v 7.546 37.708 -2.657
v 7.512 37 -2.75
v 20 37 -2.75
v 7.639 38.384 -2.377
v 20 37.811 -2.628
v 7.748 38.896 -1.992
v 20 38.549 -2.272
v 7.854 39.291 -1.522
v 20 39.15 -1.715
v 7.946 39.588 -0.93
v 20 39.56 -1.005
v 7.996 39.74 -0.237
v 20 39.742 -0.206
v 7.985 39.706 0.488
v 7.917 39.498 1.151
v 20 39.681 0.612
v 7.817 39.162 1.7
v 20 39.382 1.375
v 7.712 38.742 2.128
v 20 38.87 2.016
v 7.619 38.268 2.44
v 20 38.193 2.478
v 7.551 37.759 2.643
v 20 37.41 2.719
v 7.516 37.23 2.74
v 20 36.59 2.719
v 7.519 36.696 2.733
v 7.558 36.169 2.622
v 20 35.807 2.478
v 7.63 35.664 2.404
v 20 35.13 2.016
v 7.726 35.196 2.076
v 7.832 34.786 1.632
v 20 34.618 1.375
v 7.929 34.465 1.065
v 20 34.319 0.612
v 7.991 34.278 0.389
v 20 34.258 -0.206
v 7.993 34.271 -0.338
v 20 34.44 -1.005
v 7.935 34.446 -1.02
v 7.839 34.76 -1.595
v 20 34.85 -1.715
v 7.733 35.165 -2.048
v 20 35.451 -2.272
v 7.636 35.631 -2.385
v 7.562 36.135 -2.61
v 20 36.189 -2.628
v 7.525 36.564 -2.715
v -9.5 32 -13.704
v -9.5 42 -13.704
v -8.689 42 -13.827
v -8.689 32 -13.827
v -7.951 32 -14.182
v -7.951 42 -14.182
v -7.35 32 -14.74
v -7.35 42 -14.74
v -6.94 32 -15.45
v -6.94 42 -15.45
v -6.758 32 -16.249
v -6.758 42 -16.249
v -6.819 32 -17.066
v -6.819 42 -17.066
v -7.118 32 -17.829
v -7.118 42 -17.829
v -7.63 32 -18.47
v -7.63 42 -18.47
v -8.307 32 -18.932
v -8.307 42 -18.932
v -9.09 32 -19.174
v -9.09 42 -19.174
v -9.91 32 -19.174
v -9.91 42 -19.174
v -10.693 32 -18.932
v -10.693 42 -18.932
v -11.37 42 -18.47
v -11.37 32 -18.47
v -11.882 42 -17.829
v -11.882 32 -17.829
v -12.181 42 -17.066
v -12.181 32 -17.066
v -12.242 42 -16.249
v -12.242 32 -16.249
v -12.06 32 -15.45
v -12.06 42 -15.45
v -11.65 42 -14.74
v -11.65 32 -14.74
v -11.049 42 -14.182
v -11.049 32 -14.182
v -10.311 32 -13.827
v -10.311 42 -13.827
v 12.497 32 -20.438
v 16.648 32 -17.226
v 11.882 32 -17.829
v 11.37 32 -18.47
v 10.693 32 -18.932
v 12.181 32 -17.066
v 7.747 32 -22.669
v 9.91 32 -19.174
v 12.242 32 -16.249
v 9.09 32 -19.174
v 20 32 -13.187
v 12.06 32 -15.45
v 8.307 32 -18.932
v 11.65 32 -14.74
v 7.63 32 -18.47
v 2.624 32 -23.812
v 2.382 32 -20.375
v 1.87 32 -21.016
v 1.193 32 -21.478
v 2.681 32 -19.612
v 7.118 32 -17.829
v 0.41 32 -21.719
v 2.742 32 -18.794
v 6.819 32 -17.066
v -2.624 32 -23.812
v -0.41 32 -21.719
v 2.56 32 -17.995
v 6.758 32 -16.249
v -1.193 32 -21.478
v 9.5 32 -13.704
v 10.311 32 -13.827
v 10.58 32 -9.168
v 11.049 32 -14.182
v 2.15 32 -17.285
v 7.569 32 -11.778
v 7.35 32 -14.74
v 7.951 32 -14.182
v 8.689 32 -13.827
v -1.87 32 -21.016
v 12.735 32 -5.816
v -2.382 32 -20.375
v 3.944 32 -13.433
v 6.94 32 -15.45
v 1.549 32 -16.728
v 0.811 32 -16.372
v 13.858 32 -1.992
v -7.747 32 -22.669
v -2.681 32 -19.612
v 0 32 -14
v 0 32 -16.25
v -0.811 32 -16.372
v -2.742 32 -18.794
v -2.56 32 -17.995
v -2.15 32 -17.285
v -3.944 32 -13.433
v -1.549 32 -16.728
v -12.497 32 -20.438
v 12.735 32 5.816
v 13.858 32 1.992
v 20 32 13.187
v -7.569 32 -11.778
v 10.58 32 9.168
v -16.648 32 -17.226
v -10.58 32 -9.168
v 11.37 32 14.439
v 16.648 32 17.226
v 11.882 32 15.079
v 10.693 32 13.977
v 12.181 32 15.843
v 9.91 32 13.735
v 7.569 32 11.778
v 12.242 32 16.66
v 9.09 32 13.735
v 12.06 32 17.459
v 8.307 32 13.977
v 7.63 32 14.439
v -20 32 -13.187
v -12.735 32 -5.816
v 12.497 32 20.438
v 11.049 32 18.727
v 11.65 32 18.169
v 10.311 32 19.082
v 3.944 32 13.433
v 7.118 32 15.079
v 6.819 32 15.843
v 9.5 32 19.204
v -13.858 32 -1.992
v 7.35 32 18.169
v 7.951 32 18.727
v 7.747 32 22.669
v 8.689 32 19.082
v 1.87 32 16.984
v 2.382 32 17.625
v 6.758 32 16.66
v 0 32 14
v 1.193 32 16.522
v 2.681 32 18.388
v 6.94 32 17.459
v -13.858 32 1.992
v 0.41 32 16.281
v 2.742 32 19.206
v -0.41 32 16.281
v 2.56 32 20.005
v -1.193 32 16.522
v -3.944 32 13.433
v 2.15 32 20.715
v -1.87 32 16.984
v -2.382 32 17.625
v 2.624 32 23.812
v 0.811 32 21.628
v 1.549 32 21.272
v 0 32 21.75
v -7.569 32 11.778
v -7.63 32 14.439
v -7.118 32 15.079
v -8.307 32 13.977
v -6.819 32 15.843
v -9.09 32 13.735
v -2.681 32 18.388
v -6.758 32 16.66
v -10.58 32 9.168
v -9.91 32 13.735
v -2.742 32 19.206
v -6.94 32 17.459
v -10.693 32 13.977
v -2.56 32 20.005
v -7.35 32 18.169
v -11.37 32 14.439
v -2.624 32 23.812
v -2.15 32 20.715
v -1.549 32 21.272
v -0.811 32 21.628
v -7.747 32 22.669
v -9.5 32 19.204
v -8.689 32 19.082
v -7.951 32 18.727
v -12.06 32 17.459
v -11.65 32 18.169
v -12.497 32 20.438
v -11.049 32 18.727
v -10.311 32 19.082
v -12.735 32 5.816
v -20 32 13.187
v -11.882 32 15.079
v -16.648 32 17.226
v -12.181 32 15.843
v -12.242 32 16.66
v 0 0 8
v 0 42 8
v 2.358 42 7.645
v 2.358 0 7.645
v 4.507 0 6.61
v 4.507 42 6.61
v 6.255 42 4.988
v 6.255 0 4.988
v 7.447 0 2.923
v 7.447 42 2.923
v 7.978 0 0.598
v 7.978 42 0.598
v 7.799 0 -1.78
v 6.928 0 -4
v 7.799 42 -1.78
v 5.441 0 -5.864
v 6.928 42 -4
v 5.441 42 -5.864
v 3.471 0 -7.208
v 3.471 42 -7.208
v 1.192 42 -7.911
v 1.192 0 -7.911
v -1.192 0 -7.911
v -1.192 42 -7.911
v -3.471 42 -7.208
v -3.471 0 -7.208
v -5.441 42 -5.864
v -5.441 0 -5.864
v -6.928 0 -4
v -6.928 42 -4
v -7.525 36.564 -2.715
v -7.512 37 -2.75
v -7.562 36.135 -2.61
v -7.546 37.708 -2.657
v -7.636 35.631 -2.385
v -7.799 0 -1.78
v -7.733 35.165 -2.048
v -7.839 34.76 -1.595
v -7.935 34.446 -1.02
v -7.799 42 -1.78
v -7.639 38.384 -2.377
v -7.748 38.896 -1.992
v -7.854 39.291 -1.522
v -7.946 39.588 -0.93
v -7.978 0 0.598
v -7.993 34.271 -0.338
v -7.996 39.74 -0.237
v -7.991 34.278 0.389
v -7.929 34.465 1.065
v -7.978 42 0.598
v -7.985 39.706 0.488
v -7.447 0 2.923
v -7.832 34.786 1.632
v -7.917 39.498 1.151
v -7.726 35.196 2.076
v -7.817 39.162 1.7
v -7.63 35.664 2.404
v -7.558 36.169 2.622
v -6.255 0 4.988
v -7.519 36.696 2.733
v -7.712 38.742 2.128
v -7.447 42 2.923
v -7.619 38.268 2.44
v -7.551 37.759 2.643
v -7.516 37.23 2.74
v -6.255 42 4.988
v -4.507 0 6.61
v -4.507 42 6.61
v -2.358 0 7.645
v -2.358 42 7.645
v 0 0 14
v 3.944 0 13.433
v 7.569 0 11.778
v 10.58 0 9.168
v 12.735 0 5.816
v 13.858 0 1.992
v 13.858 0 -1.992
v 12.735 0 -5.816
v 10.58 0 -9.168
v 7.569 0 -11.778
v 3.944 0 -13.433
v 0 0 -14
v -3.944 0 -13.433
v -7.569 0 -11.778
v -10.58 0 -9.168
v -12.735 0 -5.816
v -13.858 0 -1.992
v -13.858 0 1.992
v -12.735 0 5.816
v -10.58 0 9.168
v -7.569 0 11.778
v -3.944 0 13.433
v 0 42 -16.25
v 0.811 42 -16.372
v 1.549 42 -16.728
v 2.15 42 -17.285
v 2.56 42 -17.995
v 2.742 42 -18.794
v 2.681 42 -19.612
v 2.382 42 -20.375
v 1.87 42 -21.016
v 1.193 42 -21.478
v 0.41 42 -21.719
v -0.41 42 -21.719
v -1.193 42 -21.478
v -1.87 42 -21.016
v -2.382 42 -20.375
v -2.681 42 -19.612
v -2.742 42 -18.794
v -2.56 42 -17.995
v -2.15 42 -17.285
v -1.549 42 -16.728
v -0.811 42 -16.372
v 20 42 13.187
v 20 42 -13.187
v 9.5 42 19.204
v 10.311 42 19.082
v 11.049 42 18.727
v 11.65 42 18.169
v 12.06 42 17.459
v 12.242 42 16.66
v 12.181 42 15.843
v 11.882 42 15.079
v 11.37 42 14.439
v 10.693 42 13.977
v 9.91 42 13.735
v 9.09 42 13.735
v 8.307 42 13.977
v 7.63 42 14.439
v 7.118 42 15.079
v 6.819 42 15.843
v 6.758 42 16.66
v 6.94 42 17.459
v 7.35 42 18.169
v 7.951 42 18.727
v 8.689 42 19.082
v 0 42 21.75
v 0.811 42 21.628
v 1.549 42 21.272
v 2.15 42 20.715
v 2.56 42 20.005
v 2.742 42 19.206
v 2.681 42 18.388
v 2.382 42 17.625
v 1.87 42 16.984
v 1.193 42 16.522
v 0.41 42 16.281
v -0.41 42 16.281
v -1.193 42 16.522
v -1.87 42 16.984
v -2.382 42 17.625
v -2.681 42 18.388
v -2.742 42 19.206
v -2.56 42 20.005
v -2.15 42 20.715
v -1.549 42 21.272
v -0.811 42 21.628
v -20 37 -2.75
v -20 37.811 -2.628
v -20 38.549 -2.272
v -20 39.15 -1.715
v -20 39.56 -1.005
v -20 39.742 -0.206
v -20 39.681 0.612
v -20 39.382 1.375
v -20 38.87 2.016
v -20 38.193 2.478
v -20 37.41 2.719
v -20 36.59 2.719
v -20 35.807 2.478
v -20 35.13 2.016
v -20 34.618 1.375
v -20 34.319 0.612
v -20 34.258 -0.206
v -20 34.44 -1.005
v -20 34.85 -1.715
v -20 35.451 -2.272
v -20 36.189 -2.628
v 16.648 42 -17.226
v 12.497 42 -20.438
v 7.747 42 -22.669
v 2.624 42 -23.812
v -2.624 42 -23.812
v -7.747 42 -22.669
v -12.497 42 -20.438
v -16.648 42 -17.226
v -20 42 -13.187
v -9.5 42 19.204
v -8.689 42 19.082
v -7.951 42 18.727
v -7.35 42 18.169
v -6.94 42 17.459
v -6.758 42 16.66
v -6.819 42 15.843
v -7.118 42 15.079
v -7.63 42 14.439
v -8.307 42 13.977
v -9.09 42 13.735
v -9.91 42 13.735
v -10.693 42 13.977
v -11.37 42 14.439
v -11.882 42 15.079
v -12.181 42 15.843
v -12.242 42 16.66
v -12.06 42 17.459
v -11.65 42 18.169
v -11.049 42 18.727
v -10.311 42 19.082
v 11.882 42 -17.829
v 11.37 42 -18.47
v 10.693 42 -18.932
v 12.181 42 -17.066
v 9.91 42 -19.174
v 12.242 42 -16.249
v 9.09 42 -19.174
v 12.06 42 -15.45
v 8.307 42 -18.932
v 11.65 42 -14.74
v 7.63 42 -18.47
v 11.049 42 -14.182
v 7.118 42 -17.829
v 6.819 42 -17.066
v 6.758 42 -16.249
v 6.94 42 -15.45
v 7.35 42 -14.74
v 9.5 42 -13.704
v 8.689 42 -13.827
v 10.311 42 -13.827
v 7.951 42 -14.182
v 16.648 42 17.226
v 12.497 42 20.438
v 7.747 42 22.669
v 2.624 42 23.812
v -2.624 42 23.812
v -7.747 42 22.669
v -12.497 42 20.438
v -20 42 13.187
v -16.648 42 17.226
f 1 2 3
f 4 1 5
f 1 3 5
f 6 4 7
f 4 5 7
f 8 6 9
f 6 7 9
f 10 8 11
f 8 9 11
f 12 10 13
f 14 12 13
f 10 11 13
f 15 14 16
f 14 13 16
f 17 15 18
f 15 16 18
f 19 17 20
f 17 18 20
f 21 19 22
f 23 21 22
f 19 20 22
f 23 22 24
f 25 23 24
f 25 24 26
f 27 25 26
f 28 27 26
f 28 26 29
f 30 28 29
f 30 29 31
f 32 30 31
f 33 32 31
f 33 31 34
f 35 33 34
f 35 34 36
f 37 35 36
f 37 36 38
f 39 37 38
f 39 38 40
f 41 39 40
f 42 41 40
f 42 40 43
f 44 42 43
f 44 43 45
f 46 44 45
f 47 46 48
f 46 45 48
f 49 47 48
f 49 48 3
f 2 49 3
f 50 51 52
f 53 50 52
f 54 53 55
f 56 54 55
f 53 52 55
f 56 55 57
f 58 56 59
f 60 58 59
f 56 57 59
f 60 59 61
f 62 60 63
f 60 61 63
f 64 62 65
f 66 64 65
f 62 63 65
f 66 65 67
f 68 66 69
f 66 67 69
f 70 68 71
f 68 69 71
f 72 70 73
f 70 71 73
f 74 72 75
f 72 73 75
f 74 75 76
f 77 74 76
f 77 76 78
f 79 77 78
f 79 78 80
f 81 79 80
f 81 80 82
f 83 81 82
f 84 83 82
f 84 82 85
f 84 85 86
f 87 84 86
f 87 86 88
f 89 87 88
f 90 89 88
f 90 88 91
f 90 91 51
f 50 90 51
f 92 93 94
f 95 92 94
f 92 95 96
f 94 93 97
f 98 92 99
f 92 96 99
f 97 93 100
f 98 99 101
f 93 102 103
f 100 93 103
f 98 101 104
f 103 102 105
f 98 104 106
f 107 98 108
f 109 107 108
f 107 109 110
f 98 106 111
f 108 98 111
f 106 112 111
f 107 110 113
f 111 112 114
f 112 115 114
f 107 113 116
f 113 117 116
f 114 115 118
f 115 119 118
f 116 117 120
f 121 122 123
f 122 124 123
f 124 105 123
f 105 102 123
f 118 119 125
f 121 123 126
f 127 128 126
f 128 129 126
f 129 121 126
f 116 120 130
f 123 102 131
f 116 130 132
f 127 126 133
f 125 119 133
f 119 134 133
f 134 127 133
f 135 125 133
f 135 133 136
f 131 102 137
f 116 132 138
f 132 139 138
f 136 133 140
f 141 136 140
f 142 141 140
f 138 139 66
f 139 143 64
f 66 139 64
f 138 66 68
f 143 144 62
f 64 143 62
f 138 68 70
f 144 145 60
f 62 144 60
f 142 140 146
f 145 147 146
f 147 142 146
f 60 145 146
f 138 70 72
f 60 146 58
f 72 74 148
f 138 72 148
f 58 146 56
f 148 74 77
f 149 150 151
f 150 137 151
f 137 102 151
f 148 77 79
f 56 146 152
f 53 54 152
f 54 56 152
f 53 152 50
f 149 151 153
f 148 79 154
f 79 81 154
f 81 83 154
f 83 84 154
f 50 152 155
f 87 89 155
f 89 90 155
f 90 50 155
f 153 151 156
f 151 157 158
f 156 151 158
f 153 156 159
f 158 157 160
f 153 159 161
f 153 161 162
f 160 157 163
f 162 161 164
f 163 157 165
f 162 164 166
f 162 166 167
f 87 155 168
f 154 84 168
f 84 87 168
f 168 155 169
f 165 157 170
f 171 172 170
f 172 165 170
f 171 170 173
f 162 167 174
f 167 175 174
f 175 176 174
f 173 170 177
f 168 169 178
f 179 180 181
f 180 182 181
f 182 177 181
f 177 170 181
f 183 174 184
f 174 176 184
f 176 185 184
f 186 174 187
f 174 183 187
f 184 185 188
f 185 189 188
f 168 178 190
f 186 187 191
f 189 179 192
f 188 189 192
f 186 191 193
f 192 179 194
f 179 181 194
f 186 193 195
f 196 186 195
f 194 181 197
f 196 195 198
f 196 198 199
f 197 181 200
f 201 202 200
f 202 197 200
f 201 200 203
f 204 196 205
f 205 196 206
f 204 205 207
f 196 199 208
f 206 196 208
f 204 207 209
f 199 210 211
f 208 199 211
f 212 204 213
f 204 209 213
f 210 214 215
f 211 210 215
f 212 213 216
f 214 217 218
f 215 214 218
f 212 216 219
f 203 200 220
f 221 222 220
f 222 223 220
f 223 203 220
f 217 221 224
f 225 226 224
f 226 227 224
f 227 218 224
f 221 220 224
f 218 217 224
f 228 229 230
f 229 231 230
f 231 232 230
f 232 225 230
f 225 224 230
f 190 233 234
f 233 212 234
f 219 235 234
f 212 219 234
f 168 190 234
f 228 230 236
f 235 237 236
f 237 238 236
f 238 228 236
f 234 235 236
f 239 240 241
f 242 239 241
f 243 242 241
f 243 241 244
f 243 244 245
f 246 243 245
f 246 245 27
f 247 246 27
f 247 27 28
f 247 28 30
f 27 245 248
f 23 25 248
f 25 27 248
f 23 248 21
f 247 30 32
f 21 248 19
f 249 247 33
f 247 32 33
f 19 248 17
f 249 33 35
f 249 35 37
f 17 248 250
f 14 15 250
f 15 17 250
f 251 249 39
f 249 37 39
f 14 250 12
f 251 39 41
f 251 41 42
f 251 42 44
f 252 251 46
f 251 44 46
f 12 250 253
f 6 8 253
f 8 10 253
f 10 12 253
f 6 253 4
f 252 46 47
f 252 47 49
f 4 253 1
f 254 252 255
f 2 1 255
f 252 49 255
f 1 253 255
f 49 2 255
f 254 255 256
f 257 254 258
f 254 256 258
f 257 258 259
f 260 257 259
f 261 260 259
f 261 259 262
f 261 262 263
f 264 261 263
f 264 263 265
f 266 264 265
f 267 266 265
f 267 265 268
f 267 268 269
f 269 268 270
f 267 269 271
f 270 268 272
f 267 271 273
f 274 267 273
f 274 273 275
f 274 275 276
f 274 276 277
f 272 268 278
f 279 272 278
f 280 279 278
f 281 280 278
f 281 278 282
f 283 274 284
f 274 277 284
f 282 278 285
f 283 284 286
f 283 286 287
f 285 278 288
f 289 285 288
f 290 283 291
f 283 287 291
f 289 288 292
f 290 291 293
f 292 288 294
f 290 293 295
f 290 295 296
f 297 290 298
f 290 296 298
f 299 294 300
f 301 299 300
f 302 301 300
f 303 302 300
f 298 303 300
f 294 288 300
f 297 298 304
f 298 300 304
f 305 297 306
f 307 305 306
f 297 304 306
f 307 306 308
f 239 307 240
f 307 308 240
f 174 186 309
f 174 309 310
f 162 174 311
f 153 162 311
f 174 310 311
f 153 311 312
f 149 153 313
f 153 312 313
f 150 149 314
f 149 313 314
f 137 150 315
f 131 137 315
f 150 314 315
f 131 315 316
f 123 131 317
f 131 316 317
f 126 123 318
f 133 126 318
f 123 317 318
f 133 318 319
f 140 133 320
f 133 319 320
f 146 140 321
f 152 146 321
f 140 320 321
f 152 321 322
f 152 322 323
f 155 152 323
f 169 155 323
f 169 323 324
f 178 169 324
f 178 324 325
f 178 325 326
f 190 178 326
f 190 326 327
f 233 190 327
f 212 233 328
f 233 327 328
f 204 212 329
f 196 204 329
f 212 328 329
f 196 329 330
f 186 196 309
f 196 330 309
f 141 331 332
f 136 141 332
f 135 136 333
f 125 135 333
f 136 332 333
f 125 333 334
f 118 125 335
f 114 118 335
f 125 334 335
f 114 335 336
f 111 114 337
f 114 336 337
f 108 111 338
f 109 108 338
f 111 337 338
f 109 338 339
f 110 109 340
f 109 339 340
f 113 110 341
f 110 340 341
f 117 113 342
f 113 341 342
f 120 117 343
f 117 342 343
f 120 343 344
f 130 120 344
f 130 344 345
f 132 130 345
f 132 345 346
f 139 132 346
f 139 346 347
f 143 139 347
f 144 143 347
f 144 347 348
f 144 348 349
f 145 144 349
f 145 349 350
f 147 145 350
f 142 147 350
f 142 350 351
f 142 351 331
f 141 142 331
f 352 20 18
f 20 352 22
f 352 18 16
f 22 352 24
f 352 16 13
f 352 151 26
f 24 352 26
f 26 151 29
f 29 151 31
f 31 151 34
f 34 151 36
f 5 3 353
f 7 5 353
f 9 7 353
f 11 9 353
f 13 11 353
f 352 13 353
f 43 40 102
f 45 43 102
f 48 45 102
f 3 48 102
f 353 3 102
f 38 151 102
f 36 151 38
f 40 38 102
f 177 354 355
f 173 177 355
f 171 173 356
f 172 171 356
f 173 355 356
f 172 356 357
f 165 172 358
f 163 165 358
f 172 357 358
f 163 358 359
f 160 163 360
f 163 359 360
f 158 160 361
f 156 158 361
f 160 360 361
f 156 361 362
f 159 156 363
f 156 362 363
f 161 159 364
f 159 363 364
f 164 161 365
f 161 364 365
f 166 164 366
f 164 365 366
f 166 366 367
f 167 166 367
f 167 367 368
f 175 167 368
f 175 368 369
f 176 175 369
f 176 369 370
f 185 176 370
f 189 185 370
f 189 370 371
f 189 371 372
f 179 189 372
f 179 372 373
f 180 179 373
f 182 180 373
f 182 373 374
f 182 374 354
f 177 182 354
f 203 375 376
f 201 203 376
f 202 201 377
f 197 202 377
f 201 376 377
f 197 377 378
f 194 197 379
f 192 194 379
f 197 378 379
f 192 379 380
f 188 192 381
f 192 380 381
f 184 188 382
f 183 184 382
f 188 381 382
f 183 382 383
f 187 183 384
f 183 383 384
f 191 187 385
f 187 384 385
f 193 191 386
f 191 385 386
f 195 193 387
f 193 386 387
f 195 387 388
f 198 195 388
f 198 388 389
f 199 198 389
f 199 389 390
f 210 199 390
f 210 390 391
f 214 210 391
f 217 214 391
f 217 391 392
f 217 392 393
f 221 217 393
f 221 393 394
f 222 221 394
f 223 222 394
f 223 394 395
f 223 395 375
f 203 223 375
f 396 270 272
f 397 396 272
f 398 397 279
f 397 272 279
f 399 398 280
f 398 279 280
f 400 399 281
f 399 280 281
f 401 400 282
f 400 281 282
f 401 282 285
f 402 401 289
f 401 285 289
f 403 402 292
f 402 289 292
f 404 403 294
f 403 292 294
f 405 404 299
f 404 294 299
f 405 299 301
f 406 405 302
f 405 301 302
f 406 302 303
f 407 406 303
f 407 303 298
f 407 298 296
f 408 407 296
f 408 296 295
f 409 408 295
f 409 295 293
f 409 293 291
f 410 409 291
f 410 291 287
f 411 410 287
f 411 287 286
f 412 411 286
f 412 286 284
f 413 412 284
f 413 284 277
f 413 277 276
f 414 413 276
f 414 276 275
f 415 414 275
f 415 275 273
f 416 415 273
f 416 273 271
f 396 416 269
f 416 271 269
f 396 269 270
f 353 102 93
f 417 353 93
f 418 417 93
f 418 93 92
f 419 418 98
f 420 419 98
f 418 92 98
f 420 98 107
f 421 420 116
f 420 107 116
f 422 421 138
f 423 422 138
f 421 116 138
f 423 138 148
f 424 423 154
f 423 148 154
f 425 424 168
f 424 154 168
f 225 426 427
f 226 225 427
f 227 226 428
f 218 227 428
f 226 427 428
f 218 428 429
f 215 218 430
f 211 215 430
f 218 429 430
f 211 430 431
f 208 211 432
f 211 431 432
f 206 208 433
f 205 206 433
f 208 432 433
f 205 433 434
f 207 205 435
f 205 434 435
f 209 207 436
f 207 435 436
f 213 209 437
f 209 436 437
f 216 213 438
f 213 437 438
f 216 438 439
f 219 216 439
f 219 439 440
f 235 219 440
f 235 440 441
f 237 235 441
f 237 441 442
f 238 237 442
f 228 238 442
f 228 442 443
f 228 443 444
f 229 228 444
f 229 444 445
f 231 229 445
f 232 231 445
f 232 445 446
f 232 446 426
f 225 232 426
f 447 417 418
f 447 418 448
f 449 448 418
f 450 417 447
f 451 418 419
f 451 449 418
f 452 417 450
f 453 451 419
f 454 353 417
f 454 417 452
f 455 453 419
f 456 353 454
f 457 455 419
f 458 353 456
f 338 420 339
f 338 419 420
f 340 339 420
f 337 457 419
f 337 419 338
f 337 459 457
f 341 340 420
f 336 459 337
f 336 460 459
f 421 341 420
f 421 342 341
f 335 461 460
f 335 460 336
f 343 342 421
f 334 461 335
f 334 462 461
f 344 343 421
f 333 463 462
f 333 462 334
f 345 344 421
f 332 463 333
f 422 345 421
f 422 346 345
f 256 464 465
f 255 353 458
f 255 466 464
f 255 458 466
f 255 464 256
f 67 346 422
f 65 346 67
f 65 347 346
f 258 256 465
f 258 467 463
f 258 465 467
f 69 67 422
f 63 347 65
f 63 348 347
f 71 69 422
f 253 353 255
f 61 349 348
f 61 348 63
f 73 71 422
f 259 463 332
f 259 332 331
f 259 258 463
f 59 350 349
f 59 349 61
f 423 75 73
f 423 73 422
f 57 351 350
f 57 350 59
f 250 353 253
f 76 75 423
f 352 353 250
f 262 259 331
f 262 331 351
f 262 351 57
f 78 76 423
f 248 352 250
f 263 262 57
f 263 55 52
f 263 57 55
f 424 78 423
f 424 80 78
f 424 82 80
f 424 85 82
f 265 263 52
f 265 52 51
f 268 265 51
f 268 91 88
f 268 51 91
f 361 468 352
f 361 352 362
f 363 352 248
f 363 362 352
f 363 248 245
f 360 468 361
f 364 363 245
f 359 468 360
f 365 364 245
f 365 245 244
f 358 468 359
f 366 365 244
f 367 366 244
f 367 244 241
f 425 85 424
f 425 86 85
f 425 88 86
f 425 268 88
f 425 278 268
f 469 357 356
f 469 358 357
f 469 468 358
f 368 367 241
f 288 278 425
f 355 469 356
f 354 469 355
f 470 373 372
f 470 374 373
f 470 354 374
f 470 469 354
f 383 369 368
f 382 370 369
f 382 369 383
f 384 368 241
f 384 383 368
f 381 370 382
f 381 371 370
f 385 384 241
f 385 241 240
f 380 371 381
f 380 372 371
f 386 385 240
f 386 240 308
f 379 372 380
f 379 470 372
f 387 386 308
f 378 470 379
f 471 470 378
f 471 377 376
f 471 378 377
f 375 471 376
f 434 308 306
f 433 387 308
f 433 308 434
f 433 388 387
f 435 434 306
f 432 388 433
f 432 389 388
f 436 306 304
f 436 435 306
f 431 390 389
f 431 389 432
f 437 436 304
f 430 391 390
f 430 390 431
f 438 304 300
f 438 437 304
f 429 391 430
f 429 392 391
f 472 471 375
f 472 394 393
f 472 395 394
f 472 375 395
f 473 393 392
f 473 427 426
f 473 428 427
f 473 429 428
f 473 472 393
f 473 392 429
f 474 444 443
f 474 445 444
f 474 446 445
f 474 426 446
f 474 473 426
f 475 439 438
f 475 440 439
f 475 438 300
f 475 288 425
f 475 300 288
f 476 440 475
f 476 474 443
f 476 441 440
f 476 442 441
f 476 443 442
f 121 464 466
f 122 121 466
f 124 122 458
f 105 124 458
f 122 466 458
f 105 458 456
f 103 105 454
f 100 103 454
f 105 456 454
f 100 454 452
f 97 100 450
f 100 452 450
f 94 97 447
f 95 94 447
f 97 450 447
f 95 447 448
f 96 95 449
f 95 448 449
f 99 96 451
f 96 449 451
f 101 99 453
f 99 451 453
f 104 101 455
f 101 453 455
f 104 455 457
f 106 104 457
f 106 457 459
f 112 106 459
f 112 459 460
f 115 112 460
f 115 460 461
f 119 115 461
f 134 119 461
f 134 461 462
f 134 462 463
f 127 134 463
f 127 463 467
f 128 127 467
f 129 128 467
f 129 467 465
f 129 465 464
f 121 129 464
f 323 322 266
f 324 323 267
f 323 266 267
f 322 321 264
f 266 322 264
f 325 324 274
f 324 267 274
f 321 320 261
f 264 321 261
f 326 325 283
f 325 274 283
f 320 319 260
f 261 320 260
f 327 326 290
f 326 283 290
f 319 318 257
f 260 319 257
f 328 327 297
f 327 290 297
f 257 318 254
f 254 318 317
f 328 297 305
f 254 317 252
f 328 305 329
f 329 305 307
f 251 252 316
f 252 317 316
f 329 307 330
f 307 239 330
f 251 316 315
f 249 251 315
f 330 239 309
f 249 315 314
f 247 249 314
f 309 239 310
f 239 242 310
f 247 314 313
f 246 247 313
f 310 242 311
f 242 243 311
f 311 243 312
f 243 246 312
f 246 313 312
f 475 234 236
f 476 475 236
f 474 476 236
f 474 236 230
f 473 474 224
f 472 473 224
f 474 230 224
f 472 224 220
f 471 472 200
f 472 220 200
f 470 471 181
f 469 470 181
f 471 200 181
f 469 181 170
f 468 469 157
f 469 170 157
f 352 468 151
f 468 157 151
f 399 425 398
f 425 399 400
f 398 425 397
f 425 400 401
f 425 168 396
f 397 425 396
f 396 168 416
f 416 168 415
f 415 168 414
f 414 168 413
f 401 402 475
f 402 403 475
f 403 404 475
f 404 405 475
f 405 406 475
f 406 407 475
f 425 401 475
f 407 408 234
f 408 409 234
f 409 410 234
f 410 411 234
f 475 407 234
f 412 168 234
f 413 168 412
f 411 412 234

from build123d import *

# Parameters (mm, degrees)
SKETCH1_R           = 14
BOSS_EXTRUDE1_DEPTH = 32
BOSS_EXTRUDE2_DEPTH = 10
SKETCH6_R           = 8
CUT_EXTRUDE1_DEPTH  = 53.324865011
SKETCH8_R           = 2.75
CUT_EXTRUDE2_DEPTH  = 53.324865011
SKETCH9_R           = 2.75
CUT_EXTRUDE3_DEPTH  = 63.752621447


with BuildPart() as part:
    # Sketch1 → Boss-Extrude1 (new body)
    with BuildSketch(Plane(origin=(0, 0, 0), x_dir=(1, 0, 0), z_dir=(0, 1, 0))):
        with Locations(Location((0, 0, 0), (0, 0, 270))):
            Circle(SKETCH1_R)
    extrude(amount=BOSS_EXTRUDE1_DEPTH)

    # Sketch5 → Boss-Extrude2 (add)
    with BuildSketch(Plane(origin=(0, 32, 0), x_dir=(-1, 0, 0), z_dir=(0, 1, 0))):
        with BuildLine():
            Line((-20, 13.186792576), (-20, -13.186792576))
            ThreePointArc((-20, -13.186792576), (0, -23.956032611), (20, -13.186792576))
            Line((20, -13.186792576), (20, 13.186792576))
            ThreePointArc((20, 13.186792576), (0, 23.956032611), (-20, 13.186792576))
        make_face()
    extrude(amount=BOSS_EXTRUDE2_DEPTH)

    # Sketch6 → Cut-Extrude1 (cut, through all)
    with BuildSketch(Plane(origin=(0, 42, 0), x_dir=(-1, 0, 0), z_dir=(0, 1, 0))):
        with Locations(Location((0, 0, 0), (0, 0, 90))):
            Circle(SKETCH6_R)
    extrude(amount=-CUT_EXTRUDE1_DEPTH, mode=Mode.SUBTRACT)

    # Sketch8 → Cut-Extrude2 (cut, through all)
    with BuildSketch(Plane(origin=(0, 42, 0), x_dir=(-1, 0, 0), z_dir=(0, 1, 0))):
        with Locations(Location((0, 19, 0), (0, 0, 90))):
            Circle(SKETCH8_R)
        with Locations(Location((9.5, 16.454482672, 0), (0, 0, 90))):
            Circle(SKETCH8_R)
        with Locations(Location((9.5, -16.454482672, 0), (0, 0, 90))):
            Circle(SKETCH8_R)
        with Locations(Location((0, -19, 0), (0, 0, 90))):
            Circle(SKETCH8_R)
        with Locations(Location((-9.5, -16.454482672, 0), (0, 0, 90))):
            Circle(SKETCH8_R)
        with Locations(Location((-9.5, 16.454482672, 0), (0, 0, 90))):
            Circle(SKETCH8_R)
    extrude(amount=-CUT_EXTRUDE2_DEPTH, mode=Mode.SUBTRACT)

    # Sketch9 → Cut-Extrude3 (cut, through all)
    with BuildSketch(Plane(origin=(20, 0, 0), x_dir=(0, 0, -1), z_dir=(1, 0, 0))):
        with Locations((0, 37)):
            Circle(SKETCH9_R)
    extrude(amount=-CUT_EXTRUDE3_DEPTH, mode=Mode.SUBTRACT)


solid = part.part
